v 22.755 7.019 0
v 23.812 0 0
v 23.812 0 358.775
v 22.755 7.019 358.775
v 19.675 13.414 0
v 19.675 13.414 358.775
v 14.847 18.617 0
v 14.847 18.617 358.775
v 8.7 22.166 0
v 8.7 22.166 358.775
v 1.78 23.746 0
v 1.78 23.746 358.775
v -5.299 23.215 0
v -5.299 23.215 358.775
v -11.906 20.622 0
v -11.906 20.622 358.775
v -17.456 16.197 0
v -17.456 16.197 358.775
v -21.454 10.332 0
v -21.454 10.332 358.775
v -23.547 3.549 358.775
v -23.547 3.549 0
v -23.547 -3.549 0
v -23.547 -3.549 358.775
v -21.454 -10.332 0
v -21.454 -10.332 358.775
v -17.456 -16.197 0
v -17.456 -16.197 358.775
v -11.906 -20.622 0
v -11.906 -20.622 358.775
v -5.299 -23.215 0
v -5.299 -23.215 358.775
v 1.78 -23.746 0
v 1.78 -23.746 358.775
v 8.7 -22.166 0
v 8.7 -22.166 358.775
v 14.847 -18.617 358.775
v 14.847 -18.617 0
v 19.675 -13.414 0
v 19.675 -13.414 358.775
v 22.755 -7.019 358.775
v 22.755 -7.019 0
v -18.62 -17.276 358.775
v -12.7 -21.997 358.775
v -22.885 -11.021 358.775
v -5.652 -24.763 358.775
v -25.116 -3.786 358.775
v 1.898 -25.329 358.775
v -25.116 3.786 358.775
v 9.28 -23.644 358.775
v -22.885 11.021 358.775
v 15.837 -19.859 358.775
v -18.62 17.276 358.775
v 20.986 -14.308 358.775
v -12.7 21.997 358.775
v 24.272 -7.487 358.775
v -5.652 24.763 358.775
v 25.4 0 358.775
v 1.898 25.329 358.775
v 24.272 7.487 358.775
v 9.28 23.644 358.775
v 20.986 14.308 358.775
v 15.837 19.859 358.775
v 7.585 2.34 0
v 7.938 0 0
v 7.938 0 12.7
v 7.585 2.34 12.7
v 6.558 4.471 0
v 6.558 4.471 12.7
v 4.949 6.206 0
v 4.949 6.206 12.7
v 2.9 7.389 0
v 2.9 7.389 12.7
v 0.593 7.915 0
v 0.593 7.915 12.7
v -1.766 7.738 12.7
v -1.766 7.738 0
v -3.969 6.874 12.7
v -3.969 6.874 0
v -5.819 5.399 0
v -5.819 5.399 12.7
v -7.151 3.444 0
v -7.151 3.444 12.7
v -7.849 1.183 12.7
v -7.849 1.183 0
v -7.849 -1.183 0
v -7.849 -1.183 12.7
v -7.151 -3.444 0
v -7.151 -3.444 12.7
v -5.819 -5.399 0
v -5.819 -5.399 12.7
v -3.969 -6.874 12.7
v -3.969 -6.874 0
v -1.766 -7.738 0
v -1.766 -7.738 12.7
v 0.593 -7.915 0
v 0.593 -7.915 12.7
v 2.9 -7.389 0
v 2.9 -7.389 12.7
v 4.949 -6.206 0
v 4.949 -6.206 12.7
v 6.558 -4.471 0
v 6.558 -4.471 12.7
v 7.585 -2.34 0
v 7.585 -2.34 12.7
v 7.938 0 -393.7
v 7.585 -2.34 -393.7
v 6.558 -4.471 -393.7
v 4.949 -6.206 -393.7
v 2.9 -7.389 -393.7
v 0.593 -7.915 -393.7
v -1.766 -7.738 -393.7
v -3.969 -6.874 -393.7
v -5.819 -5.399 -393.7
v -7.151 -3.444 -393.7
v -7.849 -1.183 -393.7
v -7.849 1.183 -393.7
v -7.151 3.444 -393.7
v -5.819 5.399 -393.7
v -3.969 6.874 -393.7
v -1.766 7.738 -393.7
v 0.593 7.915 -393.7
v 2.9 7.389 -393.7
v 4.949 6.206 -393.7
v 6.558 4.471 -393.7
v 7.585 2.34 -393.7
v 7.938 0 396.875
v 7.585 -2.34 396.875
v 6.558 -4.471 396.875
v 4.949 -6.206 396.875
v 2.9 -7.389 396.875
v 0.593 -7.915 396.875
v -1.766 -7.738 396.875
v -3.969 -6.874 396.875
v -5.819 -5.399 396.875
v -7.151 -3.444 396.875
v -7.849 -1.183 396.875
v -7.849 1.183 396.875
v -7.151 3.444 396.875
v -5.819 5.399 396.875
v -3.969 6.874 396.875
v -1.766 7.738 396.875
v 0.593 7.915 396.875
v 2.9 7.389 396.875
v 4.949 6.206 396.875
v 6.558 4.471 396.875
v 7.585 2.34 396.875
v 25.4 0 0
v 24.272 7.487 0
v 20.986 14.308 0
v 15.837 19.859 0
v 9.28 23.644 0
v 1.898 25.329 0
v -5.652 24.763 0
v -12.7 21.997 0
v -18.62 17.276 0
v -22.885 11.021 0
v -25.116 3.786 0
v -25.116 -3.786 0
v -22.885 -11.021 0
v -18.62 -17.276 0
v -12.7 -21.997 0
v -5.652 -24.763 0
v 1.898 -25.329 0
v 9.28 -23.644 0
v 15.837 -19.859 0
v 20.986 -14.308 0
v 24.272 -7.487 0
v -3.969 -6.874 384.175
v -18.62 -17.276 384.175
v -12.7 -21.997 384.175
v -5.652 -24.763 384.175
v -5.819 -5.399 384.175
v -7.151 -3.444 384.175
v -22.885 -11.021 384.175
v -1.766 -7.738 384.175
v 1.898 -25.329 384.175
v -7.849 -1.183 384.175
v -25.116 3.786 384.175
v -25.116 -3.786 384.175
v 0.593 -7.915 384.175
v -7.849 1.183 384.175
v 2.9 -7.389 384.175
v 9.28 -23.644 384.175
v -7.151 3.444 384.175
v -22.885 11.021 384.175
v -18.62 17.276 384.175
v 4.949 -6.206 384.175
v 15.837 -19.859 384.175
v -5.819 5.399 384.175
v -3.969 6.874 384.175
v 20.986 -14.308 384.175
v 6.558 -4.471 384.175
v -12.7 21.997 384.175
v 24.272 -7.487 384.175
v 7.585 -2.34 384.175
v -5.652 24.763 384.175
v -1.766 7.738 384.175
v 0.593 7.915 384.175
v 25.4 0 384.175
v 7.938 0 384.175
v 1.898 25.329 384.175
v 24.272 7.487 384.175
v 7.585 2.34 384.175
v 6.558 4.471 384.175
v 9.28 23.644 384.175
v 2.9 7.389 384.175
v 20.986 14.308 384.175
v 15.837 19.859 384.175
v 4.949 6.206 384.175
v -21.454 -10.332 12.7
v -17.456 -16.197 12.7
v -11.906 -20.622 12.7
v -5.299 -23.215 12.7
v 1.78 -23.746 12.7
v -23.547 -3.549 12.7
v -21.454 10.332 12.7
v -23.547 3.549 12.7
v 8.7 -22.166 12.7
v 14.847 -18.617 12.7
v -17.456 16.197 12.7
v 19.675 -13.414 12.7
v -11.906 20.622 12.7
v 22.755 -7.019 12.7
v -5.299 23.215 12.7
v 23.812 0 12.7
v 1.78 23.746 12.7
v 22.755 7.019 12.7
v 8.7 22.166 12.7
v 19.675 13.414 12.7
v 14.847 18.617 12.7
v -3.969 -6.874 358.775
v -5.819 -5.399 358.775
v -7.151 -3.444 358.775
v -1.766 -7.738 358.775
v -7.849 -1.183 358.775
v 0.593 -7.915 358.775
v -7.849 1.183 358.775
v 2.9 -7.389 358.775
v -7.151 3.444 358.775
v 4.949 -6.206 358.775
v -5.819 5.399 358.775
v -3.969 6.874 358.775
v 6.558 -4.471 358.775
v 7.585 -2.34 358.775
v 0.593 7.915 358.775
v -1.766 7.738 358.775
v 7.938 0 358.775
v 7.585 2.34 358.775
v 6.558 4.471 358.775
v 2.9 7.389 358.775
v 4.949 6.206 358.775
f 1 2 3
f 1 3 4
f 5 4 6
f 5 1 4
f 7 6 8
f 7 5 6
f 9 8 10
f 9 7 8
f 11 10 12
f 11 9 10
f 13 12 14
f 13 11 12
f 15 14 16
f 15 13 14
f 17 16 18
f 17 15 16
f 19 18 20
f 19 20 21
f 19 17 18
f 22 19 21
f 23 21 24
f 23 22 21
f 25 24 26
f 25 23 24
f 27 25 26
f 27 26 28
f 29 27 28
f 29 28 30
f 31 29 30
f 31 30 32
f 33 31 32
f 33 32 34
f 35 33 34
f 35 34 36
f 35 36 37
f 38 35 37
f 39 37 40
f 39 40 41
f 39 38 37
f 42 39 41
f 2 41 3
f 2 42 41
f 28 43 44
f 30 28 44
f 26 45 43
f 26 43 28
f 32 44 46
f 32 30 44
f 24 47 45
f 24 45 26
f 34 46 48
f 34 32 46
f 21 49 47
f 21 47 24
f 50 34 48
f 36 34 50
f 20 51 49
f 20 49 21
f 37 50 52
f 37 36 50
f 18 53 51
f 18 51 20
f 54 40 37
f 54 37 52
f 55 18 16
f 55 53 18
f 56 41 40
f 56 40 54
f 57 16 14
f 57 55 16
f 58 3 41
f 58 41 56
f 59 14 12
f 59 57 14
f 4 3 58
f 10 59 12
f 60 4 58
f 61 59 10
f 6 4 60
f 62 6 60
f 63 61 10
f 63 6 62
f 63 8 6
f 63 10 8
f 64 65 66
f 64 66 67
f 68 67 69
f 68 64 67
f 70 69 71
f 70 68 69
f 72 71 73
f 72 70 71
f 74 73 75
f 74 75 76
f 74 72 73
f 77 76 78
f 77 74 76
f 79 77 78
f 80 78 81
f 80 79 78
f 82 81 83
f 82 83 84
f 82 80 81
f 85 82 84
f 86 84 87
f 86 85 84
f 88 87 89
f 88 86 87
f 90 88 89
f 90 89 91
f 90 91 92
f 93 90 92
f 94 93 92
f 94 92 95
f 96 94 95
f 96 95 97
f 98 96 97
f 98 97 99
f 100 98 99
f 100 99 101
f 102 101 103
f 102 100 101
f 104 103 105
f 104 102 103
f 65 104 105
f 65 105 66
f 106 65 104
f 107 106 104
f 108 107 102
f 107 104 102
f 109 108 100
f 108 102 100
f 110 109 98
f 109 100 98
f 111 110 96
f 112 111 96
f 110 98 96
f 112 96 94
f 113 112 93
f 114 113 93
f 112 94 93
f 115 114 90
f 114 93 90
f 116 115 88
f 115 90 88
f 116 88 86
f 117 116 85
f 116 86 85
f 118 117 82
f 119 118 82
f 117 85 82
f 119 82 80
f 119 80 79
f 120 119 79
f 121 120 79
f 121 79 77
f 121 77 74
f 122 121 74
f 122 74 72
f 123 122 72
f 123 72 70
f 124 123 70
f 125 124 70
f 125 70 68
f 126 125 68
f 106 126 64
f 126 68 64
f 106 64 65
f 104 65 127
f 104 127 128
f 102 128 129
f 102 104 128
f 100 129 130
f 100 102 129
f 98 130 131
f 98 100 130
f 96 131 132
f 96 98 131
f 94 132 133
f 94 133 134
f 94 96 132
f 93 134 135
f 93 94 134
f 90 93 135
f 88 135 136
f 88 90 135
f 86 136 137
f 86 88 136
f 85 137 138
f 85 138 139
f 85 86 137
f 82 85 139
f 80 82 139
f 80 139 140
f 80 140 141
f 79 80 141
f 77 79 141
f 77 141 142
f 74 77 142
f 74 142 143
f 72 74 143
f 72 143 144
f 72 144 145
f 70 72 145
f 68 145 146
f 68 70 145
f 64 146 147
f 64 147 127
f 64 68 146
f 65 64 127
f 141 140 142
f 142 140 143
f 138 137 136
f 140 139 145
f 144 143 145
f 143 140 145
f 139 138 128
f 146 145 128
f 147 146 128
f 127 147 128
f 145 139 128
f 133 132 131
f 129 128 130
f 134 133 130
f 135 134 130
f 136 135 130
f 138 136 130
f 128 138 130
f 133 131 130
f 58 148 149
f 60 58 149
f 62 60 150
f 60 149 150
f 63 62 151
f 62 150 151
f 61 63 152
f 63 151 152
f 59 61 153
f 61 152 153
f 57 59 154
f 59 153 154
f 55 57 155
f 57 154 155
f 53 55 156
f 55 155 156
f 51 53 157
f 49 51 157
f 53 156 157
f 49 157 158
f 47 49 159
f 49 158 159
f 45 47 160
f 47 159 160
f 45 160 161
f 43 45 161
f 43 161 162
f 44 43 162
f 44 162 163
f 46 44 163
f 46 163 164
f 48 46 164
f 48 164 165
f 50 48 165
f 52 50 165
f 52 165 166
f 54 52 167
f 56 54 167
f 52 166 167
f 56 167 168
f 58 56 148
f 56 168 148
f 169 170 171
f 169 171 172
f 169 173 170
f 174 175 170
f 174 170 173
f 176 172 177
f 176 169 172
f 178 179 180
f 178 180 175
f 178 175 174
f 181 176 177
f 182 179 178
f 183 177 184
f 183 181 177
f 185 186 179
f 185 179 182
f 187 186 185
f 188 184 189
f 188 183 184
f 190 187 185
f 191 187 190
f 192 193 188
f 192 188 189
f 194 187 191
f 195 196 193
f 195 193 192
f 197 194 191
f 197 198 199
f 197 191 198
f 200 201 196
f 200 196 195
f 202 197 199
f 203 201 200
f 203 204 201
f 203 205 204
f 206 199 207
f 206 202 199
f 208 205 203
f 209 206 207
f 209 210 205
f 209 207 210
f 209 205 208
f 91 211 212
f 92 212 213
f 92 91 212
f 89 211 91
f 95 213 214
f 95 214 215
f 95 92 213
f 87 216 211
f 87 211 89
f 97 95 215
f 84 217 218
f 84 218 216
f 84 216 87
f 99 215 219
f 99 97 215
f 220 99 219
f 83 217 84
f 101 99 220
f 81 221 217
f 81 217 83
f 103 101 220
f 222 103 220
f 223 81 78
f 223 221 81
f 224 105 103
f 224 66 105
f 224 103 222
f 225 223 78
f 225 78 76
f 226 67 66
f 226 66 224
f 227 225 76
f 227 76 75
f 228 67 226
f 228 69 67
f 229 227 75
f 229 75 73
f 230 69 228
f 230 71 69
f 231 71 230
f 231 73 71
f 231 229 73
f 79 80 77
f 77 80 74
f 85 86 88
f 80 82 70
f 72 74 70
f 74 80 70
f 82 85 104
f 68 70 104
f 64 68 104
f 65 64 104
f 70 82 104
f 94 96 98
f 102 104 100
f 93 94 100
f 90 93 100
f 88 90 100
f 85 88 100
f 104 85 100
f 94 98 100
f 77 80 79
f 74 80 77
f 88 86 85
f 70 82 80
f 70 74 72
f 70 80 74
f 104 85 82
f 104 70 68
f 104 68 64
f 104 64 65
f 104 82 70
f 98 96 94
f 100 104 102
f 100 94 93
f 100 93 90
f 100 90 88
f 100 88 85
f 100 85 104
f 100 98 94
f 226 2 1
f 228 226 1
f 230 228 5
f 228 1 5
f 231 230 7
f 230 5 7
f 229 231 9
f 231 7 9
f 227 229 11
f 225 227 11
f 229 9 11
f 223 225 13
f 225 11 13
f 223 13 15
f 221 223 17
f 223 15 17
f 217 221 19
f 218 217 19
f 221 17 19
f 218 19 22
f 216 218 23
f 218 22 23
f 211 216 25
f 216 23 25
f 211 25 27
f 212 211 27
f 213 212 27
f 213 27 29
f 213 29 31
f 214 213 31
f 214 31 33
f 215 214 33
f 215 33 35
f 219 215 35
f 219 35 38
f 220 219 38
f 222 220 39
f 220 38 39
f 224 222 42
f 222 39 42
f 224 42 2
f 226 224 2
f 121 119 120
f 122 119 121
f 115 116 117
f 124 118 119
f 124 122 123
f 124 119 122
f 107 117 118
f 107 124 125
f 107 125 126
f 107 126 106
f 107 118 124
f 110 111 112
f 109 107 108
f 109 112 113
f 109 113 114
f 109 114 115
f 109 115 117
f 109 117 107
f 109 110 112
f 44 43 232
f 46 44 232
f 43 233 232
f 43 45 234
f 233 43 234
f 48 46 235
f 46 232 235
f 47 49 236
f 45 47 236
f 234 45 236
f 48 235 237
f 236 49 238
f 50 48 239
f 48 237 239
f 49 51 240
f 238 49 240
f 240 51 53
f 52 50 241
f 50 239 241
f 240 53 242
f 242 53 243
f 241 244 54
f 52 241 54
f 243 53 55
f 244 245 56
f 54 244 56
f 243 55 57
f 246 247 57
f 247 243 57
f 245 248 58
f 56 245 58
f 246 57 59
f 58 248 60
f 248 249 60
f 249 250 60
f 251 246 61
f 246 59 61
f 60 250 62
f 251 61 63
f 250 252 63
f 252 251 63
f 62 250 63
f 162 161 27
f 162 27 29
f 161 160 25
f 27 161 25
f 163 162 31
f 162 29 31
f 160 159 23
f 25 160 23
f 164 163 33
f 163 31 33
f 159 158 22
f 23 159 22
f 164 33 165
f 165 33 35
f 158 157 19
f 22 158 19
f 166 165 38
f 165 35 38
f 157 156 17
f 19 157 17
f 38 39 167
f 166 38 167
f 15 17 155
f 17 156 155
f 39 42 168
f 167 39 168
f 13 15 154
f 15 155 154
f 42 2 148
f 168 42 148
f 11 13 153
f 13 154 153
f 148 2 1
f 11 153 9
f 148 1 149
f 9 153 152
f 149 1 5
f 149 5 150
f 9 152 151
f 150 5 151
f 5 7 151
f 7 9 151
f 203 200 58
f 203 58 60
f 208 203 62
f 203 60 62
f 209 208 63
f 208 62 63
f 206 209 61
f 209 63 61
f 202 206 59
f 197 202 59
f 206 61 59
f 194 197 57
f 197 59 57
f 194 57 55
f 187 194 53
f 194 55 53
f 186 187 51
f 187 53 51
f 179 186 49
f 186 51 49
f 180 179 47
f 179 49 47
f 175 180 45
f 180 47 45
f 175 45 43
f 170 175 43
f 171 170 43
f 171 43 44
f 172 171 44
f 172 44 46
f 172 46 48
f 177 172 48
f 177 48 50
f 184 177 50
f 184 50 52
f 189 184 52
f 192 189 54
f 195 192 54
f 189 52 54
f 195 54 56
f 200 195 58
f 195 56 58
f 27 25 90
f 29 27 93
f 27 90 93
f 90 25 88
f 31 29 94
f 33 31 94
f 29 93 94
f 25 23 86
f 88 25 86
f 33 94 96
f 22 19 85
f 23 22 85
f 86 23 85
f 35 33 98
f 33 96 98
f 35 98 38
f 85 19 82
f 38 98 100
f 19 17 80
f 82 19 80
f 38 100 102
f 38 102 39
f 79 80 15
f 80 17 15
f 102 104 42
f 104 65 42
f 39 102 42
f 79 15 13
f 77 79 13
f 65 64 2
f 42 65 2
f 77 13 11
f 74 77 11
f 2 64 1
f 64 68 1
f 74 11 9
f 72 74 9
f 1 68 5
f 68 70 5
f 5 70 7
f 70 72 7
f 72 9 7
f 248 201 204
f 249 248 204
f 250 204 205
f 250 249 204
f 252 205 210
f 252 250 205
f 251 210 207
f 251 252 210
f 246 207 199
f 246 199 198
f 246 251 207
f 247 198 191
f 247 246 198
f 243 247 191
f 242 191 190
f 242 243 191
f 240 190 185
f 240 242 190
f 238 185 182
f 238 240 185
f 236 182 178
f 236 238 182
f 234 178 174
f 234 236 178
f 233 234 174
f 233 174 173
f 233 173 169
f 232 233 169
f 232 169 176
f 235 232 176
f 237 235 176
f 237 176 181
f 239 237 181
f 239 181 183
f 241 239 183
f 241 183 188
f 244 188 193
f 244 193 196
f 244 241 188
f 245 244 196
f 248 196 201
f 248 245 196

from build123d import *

# Parameters (mm, degrees)
F0_R     = 25.4
F0_R_2   = 23.8125
F1_DEPTH = 358.775
F2_R     = 25.4
F2_R_2   = 7.9375
F3_DEPTH = 25.4
F4_R     = 23.8125
F4_R_2   = 7.9375
F5_DEPTH = 12.7
F6_R     = 7.9375
F7_DEPTH = 396.875
F8_R     = 7.9375
F9_DEPTH = 393.7


with BuildPart() as f1:
    # F0 (on Top) → F1 (new body)
    with BuildSketch(Plane.XY):
        Circle(F0_R)
        Circle(F0_R_2, mode=Mode.SUBTRACT)
    extrude(amount=F1_DEPTH)


with BuildPart() as f3:
    # F2 (on face) → F3 (new body)
    with BuildSketch(Plane.XY.offset(358.775)):
        Circle(F2_R)
        Circle(F2_R_2, mode=Mode.SUBTRACT)
    extrude(amount=F3_DEPTH)


with BuildPart() as f5:
    # F4 (on Top) → F5 (new body)
    with BuildSketch(Plane.XY):
        Circle(F4_R)
        Circle(F4_R_2, mode=Mode.SUBTRACT)
    extrude(amount=F5_DEPTH)


with BuildPart() as f7:
    # F6 (on face) → F7 (new body)
    with BuildSketch(Plane(origin=(0, 0, 0), x_dir=(1, 0, 0), z_dir=(0, 0, -1))):
        Circle(F6_R)
    extrude(amount=-F7_DEPTH)


with BuildPart() as f9:
    # F8 (on face) → F9 (new body)
    with BuildSketch(Plane(origin=(0, 0, 0), x_dir=(1, 0, 0), z_dir=(0, 0, -1))):
        Circle(F8_R)
    extrude(amount=F9_DEPTH)


solid = Compound([f1.part, f3.part, f5.part, f7.part, f9.part])
